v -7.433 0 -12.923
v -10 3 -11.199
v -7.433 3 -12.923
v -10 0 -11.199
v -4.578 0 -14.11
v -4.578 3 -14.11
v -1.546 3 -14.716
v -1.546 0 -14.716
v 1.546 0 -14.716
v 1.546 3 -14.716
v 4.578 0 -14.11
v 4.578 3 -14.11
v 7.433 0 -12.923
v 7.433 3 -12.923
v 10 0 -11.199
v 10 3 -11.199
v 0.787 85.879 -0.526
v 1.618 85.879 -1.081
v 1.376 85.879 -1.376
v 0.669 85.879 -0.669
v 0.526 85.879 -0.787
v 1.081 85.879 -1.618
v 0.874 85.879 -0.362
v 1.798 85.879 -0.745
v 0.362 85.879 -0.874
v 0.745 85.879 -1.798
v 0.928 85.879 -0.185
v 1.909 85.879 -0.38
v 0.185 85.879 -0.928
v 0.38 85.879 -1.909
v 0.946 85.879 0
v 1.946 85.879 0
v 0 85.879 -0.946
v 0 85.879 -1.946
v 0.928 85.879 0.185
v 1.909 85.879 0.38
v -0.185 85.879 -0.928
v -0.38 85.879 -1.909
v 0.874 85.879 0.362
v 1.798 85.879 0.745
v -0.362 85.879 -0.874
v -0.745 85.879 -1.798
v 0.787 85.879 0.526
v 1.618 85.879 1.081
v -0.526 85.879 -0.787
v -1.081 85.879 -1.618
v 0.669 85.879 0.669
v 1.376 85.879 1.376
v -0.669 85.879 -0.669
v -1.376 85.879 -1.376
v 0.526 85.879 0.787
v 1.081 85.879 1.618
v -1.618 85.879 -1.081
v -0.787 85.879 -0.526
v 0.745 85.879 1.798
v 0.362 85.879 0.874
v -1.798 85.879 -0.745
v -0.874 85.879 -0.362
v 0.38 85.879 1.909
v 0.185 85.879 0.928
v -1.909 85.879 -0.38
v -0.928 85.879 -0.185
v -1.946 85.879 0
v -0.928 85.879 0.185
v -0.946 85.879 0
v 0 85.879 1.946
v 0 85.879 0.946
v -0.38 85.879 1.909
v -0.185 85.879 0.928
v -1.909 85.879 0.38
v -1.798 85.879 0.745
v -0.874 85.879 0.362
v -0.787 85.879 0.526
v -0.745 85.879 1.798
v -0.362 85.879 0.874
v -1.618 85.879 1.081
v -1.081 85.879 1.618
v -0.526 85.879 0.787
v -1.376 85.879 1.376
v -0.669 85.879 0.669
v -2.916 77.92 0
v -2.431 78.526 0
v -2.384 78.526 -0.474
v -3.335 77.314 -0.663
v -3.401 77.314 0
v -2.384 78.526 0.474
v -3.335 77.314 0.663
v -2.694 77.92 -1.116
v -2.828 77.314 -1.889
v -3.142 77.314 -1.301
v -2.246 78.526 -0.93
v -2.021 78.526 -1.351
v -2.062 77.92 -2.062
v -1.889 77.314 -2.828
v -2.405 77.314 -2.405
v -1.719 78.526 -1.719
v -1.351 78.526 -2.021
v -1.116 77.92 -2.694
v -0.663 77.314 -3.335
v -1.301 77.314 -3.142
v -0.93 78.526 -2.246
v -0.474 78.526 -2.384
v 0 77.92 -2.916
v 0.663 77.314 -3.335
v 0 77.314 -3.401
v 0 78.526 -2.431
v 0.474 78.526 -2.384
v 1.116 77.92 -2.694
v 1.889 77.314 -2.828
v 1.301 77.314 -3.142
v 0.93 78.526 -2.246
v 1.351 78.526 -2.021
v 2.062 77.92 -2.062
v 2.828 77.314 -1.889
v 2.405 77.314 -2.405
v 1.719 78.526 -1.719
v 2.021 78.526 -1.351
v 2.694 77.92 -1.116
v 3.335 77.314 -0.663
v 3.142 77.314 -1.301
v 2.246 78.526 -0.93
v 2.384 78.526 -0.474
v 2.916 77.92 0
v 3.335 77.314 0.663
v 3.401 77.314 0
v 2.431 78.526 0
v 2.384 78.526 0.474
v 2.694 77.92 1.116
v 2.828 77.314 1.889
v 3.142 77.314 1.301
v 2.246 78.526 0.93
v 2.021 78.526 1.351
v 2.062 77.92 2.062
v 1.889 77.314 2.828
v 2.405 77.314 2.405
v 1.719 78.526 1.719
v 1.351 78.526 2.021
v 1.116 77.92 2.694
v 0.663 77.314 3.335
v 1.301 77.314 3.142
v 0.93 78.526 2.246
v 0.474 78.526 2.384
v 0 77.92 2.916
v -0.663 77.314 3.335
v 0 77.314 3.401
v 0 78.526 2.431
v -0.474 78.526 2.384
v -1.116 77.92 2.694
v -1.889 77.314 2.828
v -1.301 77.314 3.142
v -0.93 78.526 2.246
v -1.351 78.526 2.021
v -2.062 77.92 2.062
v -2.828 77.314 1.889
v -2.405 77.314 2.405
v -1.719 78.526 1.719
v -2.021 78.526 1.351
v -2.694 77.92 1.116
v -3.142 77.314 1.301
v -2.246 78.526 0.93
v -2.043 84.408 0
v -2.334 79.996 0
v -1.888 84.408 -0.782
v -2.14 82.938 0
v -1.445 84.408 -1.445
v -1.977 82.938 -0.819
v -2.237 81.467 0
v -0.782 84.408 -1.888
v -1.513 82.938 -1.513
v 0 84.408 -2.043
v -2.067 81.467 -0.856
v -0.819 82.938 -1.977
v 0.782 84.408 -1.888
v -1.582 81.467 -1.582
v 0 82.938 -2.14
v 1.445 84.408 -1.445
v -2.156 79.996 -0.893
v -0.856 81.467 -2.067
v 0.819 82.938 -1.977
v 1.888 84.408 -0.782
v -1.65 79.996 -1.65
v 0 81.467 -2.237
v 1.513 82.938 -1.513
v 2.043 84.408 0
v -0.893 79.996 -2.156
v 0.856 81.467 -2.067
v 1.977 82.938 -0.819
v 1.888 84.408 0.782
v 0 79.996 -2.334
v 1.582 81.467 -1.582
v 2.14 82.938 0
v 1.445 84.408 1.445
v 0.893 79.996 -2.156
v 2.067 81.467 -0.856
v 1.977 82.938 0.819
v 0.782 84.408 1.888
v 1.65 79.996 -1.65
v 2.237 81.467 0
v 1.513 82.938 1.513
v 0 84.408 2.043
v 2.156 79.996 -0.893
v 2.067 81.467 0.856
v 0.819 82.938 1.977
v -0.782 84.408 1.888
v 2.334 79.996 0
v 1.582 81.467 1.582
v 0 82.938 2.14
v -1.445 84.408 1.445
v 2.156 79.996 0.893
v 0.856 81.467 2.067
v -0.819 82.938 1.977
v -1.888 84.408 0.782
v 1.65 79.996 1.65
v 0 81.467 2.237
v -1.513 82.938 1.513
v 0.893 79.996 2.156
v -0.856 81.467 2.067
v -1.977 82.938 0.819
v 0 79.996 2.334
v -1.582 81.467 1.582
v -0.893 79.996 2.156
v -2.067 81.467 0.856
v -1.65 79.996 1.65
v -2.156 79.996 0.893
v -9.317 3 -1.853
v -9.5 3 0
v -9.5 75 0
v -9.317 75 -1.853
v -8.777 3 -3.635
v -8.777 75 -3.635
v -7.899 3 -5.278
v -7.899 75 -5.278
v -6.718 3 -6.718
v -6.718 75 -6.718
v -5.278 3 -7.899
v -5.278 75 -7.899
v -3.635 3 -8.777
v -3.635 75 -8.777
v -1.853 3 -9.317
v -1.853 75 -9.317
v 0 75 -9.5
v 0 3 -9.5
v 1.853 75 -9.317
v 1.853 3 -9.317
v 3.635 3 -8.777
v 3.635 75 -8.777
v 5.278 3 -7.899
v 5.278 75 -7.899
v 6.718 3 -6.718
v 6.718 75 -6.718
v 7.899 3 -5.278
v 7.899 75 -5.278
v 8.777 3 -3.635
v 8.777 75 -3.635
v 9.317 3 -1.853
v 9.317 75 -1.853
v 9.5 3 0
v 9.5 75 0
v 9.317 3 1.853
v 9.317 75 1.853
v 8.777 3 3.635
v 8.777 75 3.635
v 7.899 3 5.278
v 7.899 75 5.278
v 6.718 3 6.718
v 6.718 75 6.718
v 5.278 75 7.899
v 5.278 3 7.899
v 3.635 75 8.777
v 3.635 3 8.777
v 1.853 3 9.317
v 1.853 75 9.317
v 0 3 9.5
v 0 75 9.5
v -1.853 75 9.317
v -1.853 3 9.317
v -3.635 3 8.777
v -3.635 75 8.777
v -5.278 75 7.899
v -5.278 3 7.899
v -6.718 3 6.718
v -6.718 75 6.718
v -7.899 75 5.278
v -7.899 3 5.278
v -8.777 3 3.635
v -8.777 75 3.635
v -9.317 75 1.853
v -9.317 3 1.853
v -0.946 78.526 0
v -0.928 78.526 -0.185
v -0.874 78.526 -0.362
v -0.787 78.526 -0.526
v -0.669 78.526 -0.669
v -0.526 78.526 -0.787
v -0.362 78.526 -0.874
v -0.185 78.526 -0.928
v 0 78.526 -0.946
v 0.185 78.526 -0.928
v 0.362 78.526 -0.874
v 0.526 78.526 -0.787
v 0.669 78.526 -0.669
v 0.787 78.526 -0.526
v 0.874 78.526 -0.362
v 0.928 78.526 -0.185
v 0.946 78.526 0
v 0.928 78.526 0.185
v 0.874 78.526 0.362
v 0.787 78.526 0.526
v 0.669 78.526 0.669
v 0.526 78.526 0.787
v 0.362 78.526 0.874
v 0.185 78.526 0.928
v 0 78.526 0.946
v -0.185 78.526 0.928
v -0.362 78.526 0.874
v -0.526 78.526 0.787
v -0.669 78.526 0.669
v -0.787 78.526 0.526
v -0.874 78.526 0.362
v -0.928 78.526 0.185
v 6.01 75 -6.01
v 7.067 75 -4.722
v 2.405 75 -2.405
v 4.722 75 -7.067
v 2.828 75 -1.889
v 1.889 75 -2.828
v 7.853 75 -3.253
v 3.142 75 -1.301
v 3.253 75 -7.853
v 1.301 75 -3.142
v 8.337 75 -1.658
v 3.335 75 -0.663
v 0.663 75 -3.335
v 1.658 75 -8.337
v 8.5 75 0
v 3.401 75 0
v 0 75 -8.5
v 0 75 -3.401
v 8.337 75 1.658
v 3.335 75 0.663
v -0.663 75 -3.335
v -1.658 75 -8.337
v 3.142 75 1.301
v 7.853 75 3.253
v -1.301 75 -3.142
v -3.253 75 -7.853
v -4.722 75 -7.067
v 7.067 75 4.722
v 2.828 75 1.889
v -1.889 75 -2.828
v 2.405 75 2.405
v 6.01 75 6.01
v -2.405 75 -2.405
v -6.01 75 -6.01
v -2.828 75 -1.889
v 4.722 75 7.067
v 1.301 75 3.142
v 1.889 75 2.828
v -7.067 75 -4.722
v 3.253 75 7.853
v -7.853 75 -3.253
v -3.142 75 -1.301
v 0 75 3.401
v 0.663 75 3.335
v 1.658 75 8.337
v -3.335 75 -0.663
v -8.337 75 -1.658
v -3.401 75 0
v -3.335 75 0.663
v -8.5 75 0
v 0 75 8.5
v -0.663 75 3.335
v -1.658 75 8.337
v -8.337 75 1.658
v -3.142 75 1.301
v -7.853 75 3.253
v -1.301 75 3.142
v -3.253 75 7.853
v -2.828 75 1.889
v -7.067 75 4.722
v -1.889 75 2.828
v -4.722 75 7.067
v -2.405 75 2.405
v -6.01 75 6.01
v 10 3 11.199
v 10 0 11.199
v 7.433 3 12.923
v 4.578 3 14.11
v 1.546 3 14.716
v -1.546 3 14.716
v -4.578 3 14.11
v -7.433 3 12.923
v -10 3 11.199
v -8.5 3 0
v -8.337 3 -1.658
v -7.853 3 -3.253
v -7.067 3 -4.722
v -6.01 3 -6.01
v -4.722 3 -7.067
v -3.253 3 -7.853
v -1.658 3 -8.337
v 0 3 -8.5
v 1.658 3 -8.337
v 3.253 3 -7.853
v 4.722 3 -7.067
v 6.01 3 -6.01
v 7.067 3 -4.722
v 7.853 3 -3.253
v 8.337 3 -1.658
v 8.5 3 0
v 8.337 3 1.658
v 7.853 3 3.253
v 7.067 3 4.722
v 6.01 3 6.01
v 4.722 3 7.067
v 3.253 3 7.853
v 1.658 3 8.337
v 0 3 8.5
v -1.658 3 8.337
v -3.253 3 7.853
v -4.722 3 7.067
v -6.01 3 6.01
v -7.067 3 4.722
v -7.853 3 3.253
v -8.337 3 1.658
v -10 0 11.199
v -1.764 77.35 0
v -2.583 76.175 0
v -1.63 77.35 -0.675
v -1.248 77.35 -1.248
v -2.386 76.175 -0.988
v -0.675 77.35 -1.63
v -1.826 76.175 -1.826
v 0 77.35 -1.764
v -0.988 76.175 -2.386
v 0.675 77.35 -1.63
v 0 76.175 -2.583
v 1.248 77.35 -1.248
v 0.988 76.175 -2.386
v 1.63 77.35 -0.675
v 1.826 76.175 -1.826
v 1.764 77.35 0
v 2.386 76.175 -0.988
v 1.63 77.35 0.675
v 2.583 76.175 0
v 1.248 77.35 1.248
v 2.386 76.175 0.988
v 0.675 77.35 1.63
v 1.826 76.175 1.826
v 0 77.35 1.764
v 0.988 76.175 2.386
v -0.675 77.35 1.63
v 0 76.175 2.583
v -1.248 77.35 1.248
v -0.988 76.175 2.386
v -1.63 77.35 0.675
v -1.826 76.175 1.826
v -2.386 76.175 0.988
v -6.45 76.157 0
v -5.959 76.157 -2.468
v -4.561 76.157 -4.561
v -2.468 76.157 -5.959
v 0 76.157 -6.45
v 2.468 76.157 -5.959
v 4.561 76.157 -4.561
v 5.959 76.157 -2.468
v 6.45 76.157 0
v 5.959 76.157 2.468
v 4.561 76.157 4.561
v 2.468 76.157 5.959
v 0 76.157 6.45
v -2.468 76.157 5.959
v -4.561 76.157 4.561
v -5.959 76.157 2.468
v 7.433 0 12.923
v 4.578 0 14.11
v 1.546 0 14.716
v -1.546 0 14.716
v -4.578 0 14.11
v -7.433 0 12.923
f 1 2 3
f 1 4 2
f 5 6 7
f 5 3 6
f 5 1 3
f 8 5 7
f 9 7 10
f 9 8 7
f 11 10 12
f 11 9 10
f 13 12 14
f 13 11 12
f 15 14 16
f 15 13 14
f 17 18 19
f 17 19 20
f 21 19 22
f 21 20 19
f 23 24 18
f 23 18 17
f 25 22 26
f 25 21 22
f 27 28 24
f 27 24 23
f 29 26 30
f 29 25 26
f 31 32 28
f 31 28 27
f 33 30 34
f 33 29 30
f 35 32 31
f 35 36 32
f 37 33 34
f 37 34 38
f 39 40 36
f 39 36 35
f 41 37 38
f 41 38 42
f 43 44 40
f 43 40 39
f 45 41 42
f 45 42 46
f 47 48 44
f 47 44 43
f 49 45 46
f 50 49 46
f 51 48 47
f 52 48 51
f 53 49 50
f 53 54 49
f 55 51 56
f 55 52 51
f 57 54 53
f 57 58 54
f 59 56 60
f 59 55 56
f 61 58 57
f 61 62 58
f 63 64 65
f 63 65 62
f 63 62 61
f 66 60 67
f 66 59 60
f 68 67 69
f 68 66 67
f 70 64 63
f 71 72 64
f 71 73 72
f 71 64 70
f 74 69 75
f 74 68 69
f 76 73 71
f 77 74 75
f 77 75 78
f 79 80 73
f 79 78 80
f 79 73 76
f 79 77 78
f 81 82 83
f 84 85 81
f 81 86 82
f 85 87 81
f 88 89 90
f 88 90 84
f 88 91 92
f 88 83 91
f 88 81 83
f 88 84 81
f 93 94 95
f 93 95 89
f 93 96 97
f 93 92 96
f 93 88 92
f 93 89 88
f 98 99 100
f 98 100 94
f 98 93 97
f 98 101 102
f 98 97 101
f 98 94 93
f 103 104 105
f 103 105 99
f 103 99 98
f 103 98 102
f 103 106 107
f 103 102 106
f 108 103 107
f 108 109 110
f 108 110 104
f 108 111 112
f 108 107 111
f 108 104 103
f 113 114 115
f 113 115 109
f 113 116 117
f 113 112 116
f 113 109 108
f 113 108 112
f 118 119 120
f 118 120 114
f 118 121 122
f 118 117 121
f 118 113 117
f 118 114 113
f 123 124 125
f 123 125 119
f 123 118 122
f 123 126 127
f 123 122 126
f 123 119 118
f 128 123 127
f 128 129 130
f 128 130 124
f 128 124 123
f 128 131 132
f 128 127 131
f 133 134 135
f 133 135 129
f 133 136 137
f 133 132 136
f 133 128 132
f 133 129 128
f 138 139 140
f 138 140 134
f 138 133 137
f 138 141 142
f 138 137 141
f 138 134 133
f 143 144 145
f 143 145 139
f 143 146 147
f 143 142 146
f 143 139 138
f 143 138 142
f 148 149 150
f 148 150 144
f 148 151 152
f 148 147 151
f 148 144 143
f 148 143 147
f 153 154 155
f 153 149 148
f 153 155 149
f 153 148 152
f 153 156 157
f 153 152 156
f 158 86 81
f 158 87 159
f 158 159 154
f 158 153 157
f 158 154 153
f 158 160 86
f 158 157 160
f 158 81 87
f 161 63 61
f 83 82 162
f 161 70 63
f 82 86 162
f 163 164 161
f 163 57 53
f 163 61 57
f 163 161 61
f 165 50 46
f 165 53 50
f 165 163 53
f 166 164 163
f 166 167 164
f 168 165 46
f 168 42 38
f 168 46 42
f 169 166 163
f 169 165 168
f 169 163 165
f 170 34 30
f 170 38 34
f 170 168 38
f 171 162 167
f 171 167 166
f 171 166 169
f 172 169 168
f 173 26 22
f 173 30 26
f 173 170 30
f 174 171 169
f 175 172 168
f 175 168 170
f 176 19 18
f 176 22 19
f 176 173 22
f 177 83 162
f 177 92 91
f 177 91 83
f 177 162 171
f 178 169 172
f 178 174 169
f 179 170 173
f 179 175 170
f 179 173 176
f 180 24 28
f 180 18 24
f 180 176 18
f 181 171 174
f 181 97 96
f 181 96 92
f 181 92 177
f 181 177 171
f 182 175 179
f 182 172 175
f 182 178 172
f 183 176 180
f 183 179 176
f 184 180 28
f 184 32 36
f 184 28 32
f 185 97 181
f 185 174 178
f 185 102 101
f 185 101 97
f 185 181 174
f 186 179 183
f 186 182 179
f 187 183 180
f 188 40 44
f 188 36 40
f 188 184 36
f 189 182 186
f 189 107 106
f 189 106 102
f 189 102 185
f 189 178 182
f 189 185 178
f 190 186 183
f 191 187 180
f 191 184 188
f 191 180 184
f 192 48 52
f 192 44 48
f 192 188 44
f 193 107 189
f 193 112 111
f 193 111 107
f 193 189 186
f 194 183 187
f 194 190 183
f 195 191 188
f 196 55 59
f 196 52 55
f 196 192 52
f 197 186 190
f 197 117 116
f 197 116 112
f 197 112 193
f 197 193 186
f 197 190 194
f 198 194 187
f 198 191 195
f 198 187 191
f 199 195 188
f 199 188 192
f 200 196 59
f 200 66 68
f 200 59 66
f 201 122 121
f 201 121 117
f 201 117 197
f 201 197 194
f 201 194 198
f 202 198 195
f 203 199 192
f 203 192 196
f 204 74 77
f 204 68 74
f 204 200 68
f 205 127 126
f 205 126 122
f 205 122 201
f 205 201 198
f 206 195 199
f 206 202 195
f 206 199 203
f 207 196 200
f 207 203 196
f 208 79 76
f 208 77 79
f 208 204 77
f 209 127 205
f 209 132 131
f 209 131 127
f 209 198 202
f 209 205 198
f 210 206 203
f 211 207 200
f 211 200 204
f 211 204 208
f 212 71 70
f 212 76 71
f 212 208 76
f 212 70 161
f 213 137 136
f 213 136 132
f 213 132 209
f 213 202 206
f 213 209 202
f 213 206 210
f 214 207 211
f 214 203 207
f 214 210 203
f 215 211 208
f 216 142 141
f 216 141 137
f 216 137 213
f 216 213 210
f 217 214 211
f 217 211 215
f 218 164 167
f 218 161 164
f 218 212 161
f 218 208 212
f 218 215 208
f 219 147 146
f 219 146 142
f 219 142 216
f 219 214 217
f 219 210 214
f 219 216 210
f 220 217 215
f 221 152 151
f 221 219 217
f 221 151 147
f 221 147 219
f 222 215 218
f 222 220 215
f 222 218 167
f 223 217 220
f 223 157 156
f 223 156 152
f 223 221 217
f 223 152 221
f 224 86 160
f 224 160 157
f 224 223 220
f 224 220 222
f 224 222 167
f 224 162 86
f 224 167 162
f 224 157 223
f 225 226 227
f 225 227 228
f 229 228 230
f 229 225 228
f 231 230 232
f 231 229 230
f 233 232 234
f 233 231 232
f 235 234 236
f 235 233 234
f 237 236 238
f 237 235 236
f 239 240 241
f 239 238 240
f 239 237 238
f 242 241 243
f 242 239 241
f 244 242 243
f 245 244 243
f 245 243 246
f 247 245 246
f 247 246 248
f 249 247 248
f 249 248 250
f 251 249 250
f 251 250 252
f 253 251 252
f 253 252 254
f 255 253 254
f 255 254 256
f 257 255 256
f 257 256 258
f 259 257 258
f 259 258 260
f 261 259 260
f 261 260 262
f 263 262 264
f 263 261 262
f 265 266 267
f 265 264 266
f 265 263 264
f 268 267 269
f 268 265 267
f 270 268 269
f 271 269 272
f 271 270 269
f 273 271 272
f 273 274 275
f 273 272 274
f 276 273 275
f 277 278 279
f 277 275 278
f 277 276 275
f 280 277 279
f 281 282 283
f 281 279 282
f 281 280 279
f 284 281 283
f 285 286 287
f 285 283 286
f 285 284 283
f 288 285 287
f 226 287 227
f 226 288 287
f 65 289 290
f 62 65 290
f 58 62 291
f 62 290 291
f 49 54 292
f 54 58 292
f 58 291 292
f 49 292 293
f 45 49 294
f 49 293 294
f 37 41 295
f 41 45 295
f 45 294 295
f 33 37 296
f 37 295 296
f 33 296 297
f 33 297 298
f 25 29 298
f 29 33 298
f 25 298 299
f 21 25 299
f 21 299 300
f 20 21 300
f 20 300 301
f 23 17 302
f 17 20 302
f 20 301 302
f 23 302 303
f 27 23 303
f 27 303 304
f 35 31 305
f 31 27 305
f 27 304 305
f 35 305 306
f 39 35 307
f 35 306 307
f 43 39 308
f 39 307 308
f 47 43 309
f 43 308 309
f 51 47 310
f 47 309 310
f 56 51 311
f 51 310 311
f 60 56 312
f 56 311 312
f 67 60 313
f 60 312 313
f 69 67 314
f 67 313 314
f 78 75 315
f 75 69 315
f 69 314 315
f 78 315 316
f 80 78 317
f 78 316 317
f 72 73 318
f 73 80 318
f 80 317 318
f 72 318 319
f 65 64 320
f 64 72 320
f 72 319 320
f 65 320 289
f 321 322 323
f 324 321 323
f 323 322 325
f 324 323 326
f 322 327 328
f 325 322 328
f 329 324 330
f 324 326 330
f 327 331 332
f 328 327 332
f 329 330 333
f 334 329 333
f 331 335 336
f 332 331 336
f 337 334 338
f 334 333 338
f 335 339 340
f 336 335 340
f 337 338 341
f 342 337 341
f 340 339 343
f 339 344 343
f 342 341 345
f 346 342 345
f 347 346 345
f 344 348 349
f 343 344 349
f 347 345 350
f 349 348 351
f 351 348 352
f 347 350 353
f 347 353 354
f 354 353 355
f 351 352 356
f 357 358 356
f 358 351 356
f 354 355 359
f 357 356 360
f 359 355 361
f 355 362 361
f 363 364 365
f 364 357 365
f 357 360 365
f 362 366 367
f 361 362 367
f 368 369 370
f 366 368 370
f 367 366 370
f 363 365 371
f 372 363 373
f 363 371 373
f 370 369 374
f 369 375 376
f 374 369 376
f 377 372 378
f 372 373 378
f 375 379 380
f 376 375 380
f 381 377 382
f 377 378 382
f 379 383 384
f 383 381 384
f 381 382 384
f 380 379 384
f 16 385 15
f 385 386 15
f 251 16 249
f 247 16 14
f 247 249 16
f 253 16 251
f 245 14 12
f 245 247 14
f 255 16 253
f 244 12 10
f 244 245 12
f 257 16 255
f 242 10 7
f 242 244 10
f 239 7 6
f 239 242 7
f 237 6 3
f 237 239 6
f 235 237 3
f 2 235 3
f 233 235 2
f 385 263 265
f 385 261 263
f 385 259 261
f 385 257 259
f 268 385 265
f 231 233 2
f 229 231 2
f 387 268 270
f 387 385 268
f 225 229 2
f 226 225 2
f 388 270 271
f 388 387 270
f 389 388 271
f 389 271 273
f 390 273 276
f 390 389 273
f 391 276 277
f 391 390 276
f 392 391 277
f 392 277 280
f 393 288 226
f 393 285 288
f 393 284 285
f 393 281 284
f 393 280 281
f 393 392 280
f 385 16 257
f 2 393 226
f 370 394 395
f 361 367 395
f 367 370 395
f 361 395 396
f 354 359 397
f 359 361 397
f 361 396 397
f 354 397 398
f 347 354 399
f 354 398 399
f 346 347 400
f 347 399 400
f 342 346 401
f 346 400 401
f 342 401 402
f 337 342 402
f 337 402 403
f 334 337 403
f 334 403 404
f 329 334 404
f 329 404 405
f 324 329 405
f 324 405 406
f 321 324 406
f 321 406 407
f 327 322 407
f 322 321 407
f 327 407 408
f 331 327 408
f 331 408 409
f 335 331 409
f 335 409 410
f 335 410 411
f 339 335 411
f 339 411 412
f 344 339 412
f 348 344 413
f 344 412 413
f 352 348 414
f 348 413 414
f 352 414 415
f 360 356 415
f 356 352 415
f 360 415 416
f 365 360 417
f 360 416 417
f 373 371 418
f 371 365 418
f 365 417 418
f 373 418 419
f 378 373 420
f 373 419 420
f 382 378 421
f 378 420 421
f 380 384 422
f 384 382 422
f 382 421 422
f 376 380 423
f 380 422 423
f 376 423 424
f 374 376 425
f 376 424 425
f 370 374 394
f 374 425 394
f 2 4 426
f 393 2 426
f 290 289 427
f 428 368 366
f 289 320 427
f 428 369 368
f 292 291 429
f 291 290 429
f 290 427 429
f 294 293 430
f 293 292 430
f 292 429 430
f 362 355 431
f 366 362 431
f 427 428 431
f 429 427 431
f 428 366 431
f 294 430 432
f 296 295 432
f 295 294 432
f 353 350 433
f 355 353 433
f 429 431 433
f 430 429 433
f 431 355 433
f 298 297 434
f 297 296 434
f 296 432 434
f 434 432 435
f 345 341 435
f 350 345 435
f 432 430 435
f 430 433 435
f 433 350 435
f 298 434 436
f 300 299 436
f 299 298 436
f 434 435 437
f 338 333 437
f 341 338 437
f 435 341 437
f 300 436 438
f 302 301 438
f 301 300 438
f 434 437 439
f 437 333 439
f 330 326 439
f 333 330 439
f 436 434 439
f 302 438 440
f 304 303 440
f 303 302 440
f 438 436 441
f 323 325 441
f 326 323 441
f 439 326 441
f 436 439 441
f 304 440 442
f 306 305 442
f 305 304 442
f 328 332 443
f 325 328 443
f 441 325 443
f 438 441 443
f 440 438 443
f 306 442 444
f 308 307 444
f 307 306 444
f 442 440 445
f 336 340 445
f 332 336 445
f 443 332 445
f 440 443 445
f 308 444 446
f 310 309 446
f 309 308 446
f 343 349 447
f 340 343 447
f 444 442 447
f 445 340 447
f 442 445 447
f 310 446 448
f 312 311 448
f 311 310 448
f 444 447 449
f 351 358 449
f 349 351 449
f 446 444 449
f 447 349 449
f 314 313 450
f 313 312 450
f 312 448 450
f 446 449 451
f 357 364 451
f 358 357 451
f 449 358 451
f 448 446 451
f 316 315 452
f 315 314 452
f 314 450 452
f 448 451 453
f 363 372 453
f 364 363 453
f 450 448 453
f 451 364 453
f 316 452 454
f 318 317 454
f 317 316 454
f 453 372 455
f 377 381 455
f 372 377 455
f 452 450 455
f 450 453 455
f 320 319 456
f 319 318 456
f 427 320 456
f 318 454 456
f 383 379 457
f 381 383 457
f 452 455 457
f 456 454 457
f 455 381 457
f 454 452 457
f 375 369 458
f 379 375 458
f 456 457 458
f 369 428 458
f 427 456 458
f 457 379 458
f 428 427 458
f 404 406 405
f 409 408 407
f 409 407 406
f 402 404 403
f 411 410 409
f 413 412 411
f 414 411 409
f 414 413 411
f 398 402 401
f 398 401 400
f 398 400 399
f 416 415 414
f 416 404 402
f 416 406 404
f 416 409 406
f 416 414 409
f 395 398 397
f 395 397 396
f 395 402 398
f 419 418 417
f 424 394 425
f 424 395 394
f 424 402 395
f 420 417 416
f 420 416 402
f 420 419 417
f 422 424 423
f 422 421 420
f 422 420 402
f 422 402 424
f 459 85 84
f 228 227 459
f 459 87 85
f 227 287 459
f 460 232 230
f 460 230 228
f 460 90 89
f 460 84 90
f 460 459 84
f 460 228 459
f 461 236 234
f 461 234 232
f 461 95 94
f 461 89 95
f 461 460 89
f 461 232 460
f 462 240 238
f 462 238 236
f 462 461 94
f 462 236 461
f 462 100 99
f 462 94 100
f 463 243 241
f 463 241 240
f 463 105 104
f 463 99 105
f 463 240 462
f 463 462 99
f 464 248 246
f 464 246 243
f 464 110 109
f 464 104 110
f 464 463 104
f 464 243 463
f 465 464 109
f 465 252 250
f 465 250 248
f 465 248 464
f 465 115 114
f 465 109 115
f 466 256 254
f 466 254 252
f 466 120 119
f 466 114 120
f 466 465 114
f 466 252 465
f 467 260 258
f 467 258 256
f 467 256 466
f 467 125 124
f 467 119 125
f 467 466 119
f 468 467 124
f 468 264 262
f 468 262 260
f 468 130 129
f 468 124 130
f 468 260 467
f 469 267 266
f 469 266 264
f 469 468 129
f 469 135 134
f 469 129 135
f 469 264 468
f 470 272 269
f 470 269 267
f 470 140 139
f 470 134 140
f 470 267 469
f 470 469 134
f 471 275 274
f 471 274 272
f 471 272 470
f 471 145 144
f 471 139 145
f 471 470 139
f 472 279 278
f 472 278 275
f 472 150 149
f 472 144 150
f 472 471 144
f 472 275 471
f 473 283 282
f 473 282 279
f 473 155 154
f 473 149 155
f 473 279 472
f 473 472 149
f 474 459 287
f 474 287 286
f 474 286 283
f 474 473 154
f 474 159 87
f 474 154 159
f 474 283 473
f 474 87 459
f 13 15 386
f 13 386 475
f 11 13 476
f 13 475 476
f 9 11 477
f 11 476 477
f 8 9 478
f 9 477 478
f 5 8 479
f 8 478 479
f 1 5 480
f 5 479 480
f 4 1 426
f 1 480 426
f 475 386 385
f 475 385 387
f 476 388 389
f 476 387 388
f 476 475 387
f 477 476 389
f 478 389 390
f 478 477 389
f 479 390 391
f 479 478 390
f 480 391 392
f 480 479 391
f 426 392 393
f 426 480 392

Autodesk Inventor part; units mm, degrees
ref_plane "YZ Plane" through (0, 0, 0) normal (1, 0, 0) x (0, 1, 0)
ref_plane "XZ Plane" through (0, 0, 0) normal (0, 1, 0) x (-1, 0, 0)
ref_plane "XY Plane" through (0, 0, 0) normal (0, 0, 1) x (1, 0, 0)
sketch "Sketch1" plane through (0, 0, 0) normal (0, 1, 0) x (-1, 0, 0)
  circle A0 centre (0, 0) radius 8.5
  line L0 (10, -11.1988) -> (10, 11.1988)
  line L1 (-10, 11.1988) -> (-10, -11.1988)
  line L2 (-10, -14.792) -> (10, 14.792) construction
  line L3 (10, -14.792) -> (-10, 14.792) construction
  line L4 (10, 11.1988) -> (-10, 11.1988) construction
  arc A1 (10, 11.1988) -> (-10, 11.1988) centre (0, -0.9197) ccw
  line L5 (14.8819, 0) -> (-15.6848, 0) construction
  arc A2 (-10, -11.1988) -> (10, -11.1988) centre (0, 0.9197) ccw
  circle A3 centre (0, 0) radius 9.5
  dimension "d0" = 17
  dimension "d1" = 20
  dimension "d2" = 1
extrude "Extrusion1" add sketch "Sketch1" along normal blind 75 contours A3
extrude "Extrusion2" add sketch "Sketch1" along normal blind 3
sketch "Sketch2" plane through (0, 0, 0) normal (0, 0, 1) x (1, 0, 0)
  line L0 (9.5, 75) -> (-9.5, 75) projected
  line L1 (-9.5, 75) -> (-7.5, 75)
  line L2 (-7.5, 75) -> (-3.4008, 77.3135)
  line L3 (-3.4008, 77.3135) -> (-2.4311, 78.5256)
  line L4 (-2.4311, 78.5256) -> (-1.9463, 85.879)
  line L5 (-1.9463, 85.879) -> (-0.9463, 85.879)
  line L6 (-0.9463, 85.879) -> (-0.9463, 78.5256)
  line L7 (-0.9463, 78.5256) -> (-3.4008, 75)
  line L8 (-3.4008, 75) -> (-9.5, 75)
  line L9 (-3.4008, 77.3135) -> (-9.5, 75)
  line L10 (0, -17.1758) -> (0, 103.0548) projected
  point P0 (0, 0)
  dimension "d7" = 2
  dimension "d8" = 1
revolve "Revolution1" add sketch "Sketch2" angle 360 about axis through (0, -10, 0) along (0, 1, 0)
properties part number "Small Syringe"
